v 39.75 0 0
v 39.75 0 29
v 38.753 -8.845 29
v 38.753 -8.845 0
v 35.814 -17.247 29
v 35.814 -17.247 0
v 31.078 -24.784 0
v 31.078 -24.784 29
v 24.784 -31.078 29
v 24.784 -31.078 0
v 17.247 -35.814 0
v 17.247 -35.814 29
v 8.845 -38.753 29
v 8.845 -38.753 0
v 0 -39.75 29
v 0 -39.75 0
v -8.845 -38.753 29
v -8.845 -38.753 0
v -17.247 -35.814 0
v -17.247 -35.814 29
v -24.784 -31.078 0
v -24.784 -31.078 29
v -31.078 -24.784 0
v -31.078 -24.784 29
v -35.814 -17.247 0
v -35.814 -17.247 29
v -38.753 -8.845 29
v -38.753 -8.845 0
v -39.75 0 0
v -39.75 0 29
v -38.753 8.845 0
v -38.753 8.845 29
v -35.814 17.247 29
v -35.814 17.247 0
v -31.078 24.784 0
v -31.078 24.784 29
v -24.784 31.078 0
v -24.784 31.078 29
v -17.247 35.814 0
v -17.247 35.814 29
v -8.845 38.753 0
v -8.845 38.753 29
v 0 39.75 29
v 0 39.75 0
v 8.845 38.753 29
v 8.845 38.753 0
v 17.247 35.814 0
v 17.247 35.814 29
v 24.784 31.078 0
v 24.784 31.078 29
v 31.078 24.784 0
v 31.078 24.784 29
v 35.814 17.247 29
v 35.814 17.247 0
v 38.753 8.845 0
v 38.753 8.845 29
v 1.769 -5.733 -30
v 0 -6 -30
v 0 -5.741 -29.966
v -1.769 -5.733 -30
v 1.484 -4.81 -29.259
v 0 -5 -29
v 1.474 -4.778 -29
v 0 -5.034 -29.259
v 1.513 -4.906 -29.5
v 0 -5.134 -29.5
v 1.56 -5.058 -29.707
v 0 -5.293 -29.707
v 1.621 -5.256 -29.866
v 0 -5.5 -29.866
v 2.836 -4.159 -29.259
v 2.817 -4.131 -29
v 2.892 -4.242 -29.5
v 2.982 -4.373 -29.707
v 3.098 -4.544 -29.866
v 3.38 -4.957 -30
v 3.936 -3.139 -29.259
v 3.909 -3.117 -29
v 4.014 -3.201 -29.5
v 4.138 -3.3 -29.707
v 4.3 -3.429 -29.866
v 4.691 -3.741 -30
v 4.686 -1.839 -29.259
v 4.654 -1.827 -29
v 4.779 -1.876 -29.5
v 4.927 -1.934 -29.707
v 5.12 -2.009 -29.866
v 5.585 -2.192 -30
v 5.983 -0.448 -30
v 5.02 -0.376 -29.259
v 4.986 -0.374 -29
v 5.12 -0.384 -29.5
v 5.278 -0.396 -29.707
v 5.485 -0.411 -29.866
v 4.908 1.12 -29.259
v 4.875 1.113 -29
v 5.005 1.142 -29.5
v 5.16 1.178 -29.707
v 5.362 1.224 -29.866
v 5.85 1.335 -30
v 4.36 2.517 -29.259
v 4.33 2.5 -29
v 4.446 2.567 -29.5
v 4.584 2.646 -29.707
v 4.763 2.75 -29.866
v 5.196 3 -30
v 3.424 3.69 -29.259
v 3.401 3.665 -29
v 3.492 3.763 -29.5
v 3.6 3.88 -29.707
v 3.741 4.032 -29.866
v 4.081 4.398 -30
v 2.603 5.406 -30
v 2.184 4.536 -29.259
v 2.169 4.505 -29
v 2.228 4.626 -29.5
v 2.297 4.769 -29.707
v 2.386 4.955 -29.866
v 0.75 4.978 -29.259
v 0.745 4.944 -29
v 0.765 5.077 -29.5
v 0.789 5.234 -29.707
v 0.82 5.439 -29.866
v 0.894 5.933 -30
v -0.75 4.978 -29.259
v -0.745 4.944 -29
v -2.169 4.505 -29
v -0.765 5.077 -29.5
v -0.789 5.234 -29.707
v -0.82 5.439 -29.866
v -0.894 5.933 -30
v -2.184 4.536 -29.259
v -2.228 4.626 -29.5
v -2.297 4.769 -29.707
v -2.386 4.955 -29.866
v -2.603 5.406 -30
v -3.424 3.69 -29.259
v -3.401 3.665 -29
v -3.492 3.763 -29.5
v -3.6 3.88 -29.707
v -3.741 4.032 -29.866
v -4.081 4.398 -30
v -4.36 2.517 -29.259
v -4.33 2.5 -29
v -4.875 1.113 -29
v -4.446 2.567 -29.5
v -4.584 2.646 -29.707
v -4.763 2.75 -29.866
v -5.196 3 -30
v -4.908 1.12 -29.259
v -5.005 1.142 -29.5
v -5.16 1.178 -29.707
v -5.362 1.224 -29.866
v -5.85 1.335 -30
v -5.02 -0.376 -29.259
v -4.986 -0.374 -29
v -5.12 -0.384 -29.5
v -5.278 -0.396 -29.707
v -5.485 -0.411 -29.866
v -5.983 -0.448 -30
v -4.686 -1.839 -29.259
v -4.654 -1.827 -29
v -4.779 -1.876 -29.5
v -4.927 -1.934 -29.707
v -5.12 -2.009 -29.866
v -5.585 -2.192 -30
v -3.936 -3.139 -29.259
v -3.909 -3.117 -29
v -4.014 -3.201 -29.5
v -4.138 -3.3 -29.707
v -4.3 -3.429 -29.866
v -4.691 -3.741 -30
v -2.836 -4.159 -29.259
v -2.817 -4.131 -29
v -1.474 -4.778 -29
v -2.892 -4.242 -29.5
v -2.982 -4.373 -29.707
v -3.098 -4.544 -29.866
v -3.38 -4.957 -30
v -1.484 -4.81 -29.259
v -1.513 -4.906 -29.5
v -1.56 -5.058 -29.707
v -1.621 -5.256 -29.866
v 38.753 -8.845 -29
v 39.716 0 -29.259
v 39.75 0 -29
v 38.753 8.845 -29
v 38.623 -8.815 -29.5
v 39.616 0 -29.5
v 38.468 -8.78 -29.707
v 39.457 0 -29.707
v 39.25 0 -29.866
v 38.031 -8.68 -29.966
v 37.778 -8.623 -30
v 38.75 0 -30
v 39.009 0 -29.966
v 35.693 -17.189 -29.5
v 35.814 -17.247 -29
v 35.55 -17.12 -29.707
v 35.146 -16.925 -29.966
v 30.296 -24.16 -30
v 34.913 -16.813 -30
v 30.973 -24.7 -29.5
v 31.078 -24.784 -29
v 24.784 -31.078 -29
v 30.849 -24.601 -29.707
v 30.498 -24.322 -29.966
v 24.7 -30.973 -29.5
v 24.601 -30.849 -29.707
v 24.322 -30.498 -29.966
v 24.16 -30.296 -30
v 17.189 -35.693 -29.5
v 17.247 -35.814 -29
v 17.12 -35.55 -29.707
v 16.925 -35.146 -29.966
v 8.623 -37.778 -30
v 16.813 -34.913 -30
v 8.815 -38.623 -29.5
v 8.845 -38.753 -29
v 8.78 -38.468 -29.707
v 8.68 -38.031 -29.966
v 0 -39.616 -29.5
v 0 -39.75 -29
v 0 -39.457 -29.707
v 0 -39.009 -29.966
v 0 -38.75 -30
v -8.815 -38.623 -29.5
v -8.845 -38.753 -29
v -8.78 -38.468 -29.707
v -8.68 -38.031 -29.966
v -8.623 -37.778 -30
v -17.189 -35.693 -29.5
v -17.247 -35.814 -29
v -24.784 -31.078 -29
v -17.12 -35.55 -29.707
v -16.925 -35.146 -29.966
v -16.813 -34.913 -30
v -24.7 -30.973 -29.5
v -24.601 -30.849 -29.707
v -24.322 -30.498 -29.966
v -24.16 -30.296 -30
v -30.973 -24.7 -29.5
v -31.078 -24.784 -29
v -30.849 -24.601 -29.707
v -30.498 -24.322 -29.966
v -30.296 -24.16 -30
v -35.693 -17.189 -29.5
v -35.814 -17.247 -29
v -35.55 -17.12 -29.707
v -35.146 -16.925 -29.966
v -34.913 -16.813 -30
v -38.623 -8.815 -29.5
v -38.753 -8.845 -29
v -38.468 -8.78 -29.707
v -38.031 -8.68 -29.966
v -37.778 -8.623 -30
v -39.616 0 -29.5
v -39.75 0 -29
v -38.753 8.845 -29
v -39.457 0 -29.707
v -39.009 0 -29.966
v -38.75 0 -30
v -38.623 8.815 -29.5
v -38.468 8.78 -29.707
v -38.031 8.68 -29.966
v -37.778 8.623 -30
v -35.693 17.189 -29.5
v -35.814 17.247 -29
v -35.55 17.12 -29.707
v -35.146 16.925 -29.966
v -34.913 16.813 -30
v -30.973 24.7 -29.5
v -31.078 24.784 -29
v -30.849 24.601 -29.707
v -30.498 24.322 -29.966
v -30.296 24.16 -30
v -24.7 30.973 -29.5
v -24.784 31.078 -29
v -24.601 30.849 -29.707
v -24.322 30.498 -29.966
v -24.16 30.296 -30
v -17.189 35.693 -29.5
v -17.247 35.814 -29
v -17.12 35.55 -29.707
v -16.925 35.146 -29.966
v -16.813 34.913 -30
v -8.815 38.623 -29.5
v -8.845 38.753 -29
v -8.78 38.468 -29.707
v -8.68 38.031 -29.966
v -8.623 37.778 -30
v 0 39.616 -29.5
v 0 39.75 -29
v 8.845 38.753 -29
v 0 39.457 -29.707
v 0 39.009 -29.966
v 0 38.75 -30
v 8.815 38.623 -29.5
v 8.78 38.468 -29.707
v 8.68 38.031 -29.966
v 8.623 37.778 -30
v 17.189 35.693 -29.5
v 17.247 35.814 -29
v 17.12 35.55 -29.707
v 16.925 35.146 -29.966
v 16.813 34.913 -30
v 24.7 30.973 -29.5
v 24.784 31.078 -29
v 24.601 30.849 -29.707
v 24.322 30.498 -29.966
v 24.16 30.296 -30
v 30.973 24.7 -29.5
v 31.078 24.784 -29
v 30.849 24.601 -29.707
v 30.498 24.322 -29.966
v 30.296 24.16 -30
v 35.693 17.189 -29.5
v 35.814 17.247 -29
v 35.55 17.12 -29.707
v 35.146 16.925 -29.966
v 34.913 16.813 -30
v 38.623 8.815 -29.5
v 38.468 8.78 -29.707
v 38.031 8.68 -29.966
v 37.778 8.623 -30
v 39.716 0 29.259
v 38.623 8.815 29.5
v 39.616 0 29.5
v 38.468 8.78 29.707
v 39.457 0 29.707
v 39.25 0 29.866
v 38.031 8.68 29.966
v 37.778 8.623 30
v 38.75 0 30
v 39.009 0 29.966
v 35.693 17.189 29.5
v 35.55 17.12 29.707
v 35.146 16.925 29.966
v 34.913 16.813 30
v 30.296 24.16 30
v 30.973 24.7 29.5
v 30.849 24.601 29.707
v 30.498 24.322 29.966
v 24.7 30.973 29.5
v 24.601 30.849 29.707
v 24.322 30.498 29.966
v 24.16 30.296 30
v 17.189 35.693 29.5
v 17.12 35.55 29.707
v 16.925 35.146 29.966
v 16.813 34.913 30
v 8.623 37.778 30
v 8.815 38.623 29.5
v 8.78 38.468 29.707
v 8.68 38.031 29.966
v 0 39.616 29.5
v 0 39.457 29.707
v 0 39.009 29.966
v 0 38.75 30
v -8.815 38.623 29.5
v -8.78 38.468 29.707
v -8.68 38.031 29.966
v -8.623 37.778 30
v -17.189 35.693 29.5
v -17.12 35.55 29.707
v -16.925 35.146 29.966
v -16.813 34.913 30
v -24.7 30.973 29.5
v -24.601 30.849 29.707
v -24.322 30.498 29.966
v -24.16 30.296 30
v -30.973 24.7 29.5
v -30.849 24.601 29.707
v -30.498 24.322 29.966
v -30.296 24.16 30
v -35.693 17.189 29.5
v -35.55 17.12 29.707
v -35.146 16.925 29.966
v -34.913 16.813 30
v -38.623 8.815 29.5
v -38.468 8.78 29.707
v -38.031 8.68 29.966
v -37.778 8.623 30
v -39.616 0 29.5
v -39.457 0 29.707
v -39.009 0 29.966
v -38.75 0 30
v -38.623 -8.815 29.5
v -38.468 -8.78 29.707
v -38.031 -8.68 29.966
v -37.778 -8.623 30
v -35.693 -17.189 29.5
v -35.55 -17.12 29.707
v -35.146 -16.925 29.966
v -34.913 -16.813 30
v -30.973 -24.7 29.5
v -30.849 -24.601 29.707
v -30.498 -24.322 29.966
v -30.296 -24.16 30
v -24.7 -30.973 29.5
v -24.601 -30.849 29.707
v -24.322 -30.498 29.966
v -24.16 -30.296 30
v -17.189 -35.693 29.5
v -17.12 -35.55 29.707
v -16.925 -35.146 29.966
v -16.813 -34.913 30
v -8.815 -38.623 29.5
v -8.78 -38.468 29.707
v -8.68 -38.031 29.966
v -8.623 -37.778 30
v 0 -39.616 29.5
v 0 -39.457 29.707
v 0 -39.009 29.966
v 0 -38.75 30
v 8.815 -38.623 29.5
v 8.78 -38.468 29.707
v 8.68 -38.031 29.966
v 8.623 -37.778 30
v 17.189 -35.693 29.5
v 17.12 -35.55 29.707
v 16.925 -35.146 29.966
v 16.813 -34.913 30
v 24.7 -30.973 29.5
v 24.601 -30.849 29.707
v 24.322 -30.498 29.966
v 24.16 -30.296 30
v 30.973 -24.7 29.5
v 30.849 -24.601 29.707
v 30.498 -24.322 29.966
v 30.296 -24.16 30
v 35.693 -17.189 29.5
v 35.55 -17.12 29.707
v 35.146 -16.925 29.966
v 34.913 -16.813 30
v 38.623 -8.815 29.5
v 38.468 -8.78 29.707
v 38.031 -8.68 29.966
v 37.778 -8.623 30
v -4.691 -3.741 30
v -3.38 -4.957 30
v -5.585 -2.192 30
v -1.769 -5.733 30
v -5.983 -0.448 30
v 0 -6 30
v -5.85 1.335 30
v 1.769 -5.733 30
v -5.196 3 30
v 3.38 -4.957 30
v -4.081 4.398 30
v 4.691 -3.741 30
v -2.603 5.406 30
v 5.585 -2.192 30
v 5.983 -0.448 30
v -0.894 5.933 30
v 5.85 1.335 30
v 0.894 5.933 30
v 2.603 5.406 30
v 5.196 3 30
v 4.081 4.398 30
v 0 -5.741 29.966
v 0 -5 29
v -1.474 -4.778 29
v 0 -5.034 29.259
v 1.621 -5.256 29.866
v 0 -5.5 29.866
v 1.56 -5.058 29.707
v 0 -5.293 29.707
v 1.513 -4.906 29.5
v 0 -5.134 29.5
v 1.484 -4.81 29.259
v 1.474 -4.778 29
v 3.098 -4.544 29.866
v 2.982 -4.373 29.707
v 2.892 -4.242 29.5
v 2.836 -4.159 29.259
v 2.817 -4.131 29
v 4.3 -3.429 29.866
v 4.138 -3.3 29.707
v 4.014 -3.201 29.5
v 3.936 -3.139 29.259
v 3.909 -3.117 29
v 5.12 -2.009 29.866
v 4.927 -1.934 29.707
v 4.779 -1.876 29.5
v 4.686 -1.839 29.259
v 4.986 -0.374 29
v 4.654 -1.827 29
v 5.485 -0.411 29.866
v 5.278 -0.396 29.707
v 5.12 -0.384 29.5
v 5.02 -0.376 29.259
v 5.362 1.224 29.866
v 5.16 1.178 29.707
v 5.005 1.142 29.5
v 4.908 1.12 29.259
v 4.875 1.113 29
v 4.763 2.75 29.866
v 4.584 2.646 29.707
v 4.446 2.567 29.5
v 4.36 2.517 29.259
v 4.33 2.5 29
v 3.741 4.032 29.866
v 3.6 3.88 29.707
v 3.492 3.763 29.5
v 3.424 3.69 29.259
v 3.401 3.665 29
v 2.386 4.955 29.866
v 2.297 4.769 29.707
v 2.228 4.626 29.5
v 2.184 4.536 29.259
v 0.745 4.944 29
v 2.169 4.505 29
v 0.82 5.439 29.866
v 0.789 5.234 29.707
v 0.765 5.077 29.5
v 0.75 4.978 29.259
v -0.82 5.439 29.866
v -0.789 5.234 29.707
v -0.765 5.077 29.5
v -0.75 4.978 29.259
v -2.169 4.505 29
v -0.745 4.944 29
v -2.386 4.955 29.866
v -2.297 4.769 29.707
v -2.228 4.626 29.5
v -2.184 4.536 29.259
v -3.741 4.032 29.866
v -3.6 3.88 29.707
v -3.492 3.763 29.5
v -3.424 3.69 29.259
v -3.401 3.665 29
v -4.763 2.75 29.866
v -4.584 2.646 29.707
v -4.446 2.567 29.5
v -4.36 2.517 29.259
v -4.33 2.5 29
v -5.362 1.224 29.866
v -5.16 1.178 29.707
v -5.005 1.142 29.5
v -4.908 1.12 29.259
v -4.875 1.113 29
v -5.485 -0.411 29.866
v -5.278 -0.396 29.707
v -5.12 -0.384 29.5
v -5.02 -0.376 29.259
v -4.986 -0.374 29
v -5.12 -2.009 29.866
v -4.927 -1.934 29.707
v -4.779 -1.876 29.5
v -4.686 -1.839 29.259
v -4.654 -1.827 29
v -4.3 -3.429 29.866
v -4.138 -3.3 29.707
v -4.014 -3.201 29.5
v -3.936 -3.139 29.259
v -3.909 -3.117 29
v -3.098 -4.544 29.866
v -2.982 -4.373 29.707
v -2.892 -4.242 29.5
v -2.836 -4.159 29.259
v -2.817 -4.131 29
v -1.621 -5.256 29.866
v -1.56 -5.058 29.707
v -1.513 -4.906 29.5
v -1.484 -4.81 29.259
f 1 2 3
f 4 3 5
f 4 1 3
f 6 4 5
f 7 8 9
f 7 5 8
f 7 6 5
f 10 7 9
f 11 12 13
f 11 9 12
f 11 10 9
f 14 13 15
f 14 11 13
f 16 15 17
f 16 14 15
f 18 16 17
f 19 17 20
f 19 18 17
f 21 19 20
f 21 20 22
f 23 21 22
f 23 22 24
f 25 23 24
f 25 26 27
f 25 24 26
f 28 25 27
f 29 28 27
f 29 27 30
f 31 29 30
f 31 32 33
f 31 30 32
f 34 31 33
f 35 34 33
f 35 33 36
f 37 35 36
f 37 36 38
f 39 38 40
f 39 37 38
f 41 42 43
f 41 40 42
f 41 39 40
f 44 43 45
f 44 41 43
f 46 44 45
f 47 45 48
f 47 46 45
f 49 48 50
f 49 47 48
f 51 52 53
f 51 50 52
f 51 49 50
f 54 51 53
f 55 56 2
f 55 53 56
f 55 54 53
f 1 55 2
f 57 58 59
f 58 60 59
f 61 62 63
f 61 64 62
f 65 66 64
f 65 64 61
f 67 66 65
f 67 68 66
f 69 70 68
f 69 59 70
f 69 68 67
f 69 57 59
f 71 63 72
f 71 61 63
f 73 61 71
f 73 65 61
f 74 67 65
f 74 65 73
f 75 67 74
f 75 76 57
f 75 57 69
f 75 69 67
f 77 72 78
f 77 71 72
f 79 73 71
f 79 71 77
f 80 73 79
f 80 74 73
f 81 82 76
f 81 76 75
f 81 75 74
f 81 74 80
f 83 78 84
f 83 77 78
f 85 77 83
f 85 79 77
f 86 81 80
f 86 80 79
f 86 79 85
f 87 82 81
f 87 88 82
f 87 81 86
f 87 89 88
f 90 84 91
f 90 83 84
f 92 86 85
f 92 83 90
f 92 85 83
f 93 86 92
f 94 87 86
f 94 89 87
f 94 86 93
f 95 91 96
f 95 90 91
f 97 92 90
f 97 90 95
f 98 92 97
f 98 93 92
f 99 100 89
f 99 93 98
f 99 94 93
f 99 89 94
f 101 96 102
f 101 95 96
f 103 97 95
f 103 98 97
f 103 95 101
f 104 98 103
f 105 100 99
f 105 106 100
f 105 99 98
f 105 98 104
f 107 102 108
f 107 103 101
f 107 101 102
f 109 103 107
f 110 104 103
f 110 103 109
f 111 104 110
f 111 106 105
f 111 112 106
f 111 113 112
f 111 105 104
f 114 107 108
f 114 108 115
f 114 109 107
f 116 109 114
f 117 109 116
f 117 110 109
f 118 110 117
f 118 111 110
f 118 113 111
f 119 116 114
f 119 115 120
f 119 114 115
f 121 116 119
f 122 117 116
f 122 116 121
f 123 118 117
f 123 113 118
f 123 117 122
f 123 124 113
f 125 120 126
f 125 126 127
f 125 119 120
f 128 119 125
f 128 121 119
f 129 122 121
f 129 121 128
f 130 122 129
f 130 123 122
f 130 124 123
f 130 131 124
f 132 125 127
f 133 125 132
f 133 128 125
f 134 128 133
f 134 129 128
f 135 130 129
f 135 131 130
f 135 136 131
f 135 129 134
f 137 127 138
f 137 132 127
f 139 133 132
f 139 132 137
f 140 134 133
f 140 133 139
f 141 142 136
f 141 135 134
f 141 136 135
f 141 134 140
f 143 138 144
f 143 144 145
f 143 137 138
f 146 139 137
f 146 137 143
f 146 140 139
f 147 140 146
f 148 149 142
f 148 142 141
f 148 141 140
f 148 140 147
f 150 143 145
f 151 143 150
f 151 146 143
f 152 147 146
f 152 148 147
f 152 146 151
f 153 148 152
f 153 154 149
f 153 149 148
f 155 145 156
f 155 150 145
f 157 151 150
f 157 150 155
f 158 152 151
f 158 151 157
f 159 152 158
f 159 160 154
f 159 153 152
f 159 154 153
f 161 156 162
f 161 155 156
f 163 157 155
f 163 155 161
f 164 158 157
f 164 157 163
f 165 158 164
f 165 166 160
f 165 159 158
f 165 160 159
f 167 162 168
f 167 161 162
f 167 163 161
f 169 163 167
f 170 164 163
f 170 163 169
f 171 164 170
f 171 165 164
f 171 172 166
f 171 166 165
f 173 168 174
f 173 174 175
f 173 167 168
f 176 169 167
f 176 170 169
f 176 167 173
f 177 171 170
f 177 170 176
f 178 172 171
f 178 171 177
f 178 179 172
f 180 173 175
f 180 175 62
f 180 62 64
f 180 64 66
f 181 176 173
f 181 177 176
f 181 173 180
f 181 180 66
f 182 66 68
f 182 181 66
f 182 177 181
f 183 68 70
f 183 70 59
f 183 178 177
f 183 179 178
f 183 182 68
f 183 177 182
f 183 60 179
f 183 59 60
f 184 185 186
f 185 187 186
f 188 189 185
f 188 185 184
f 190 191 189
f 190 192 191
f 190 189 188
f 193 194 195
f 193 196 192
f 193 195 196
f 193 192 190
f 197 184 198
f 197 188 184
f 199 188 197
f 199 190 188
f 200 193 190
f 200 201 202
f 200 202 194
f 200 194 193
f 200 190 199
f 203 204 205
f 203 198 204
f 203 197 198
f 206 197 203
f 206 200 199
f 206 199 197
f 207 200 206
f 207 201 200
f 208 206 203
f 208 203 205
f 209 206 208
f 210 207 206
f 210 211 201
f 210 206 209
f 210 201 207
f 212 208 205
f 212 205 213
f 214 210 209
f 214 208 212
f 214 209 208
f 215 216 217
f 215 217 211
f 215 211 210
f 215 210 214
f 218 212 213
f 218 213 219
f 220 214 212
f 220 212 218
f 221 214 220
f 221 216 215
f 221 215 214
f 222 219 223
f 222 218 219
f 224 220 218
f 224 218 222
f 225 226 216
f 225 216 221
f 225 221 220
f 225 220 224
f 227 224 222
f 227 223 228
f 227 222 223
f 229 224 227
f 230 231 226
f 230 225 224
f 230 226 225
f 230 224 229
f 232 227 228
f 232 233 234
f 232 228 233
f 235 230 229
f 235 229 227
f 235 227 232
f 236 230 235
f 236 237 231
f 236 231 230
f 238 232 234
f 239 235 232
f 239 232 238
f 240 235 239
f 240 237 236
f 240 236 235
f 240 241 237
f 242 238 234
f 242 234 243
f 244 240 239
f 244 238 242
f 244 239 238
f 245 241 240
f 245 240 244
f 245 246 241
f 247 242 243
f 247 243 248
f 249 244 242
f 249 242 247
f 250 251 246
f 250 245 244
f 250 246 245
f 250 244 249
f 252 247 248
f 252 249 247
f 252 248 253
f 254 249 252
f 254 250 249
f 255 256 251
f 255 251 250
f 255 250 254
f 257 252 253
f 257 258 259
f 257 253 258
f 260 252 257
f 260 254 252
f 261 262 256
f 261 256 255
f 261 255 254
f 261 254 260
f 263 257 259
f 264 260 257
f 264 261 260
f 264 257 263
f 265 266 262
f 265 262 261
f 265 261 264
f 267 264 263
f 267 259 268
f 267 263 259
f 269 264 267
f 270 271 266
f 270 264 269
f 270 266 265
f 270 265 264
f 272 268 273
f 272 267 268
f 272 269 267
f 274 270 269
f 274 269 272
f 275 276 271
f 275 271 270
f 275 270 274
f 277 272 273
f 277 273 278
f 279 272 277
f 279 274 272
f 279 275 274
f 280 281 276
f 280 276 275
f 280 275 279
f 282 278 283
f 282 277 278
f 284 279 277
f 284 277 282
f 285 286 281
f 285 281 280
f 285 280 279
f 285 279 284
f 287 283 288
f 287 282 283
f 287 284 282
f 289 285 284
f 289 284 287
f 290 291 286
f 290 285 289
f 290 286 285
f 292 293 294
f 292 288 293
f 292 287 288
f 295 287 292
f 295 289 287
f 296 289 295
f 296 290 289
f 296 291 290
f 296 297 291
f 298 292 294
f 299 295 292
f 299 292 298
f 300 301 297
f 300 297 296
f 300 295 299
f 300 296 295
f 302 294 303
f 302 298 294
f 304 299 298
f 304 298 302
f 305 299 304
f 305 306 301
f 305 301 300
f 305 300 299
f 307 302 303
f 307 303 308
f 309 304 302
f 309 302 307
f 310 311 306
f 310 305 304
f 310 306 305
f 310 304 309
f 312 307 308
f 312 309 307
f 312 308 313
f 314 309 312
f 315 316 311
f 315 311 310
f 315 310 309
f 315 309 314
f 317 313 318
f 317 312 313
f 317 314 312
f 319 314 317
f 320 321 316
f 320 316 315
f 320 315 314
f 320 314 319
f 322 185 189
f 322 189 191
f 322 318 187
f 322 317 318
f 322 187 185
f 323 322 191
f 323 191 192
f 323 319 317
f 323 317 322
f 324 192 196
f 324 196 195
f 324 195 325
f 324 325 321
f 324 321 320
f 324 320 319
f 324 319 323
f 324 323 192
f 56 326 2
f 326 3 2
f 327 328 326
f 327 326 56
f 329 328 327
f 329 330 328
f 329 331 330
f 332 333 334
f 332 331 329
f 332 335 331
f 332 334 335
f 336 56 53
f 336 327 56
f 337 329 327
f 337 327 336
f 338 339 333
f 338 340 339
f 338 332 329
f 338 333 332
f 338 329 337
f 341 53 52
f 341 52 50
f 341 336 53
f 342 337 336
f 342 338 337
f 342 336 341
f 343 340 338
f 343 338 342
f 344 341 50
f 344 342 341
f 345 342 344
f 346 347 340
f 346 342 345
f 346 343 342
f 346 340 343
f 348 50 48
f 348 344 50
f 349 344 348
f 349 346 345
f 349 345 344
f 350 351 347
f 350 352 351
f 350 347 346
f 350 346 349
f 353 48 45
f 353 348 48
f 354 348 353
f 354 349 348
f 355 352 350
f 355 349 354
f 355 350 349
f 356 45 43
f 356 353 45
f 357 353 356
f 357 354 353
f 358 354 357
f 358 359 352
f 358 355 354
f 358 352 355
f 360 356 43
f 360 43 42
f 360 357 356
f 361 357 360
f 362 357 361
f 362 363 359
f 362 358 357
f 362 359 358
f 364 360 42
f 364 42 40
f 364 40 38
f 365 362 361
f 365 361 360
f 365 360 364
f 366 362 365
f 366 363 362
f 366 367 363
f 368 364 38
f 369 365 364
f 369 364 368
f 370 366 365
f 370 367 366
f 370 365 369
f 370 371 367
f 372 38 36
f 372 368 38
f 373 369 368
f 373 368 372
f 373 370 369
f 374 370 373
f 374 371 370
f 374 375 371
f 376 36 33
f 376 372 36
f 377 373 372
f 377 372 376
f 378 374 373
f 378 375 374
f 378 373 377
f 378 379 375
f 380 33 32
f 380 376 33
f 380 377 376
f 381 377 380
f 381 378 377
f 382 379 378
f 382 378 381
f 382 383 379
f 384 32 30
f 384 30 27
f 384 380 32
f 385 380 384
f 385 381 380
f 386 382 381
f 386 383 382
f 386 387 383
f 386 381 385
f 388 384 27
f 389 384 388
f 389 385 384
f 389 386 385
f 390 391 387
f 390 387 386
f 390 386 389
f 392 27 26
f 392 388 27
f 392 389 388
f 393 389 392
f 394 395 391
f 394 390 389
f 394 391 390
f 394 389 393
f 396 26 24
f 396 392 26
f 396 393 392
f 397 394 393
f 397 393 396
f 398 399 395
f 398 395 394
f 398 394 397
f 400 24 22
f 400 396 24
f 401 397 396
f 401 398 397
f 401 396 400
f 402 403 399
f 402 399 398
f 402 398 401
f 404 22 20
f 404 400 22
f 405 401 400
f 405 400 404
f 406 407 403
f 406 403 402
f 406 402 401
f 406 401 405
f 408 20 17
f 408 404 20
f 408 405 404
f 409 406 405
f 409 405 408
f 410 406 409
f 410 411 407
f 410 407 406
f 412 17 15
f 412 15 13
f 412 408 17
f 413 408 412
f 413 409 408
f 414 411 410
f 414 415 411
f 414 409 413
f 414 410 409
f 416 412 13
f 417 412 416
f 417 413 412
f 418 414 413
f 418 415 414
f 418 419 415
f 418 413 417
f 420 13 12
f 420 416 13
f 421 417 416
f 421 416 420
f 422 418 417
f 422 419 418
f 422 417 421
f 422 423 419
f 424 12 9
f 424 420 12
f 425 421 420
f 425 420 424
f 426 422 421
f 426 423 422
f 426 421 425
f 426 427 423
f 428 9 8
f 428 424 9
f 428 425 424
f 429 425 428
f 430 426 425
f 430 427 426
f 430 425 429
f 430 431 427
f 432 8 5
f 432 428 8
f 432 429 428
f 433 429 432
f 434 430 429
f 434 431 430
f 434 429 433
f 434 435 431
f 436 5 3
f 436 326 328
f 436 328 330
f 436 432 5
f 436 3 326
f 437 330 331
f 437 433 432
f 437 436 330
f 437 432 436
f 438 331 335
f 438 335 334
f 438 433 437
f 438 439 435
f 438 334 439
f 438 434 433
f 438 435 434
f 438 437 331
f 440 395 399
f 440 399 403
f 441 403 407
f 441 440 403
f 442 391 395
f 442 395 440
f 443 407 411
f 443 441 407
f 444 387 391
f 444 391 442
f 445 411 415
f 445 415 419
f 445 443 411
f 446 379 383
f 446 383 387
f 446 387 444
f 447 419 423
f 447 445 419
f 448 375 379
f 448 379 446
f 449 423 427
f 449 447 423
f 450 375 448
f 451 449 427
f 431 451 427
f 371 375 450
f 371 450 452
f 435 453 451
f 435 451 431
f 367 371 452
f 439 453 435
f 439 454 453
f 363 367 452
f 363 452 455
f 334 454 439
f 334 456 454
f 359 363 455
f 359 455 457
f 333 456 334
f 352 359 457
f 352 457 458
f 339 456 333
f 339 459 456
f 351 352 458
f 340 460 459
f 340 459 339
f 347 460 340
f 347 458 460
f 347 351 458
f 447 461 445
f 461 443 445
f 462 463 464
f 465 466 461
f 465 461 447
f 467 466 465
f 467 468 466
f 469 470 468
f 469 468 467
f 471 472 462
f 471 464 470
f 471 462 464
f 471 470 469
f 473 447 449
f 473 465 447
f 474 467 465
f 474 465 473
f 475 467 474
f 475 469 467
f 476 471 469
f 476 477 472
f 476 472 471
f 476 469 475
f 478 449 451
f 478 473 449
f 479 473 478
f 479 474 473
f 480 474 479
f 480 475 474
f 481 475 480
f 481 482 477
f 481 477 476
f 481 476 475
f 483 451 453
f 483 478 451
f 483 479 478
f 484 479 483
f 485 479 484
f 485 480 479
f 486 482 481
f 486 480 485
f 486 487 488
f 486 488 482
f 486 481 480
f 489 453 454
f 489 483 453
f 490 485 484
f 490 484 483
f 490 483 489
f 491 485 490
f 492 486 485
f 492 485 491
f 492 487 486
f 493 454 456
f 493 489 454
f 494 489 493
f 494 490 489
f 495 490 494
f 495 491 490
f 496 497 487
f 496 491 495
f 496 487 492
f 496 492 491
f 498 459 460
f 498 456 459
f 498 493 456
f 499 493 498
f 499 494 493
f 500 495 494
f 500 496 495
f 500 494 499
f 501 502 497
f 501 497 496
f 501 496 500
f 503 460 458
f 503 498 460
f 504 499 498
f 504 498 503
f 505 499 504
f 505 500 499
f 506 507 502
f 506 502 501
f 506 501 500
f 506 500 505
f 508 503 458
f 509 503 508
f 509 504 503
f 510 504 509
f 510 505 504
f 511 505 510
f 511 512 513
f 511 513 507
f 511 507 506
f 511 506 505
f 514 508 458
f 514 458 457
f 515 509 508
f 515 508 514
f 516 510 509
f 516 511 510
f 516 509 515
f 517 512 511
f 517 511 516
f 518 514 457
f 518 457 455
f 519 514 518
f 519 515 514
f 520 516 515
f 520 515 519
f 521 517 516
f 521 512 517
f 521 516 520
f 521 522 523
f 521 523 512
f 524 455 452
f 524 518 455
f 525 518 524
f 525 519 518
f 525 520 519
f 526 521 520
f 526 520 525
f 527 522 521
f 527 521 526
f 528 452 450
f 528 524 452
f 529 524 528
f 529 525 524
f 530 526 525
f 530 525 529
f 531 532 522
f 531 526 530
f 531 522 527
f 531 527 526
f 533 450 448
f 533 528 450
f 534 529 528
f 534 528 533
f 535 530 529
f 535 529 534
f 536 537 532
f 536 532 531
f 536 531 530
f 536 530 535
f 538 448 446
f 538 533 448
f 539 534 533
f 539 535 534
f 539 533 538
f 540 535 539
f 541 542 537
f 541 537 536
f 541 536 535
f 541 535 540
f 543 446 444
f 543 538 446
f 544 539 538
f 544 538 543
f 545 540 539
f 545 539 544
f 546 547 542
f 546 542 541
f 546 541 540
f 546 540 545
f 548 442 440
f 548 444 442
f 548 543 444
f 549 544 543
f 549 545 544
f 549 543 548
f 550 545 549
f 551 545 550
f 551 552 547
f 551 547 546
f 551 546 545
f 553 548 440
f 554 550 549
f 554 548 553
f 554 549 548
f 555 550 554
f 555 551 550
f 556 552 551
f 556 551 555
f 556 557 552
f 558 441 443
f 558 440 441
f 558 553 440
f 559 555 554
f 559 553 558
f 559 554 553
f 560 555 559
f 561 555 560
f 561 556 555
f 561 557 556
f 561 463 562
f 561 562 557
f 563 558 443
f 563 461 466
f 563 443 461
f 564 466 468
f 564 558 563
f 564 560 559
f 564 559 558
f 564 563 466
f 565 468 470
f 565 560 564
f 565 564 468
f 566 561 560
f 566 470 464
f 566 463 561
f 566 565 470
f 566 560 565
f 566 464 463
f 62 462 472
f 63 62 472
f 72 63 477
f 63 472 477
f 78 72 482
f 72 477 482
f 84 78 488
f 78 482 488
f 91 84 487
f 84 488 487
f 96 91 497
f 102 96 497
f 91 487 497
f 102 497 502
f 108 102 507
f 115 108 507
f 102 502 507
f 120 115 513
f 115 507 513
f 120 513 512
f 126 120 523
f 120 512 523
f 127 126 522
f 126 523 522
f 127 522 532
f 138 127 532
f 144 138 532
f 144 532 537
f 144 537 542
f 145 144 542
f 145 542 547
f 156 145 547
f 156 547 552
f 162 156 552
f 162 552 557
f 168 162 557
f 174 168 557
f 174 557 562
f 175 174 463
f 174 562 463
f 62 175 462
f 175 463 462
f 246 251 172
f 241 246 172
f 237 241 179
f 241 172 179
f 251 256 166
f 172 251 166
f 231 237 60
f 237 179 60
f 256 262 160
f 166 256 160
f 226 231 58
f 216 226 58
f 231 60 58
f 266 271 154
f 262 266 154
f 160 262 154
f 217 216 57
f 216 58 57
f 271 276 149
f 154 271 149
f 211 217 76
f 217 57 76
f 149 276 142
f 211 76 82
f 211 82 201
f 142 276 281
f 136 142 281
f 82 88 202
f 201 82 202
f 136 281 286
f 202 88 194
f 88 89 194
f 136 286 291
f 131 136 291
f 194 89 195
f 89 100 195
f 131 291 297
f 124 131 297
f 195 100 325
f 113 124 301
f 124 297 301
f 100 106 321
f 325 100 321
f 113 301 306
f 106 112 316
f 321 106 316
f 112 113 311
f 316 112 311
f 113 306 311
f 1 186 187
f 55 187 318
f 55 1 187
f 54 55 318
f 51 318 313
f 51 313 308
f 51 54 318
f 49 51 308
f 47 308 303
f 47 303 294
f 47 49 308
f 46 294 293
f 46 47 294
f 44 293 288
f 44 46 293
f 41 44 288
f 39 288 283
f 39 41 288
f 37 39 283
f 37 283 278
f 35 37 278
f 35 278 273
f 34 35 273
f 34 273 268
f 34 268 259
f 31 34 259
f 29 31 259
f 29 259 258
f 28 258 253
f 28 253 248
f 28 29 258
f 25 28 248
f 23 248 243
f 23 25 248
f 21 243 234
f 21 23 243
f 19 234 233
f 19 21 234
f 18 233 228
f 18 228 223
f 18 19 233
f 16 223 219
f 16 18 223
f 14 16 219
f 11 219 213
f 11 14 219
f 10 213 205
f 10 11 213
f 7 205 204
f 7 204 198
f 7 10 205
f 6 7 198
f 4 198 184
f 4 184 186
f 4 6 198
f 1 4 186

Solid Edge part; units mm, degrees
sketch "Sketch1" plane through (0, 0, 0) normal (0, 0, 1) x (1, 0, 0)
  circle A0 centre (0, 0) radius 39.75
  dimension "D1" = 79.5
extrude "ExtrudedProtrusion_1" add sketch "Sketch1" along normal mid plane 60
fillet "Round_1" radius 1 2 edges at (-39.75, 0, 30) (-39.75, 0, -30)
hole "Hole_1" at (0, 0, 30) direction (0, 0, -1) diameter 10 end up to next
fillet "Round_2" radius 1 2 edges at (-5, 0, 30) (5, 0, -30)
properties material "Acrylic, high impact grade"
